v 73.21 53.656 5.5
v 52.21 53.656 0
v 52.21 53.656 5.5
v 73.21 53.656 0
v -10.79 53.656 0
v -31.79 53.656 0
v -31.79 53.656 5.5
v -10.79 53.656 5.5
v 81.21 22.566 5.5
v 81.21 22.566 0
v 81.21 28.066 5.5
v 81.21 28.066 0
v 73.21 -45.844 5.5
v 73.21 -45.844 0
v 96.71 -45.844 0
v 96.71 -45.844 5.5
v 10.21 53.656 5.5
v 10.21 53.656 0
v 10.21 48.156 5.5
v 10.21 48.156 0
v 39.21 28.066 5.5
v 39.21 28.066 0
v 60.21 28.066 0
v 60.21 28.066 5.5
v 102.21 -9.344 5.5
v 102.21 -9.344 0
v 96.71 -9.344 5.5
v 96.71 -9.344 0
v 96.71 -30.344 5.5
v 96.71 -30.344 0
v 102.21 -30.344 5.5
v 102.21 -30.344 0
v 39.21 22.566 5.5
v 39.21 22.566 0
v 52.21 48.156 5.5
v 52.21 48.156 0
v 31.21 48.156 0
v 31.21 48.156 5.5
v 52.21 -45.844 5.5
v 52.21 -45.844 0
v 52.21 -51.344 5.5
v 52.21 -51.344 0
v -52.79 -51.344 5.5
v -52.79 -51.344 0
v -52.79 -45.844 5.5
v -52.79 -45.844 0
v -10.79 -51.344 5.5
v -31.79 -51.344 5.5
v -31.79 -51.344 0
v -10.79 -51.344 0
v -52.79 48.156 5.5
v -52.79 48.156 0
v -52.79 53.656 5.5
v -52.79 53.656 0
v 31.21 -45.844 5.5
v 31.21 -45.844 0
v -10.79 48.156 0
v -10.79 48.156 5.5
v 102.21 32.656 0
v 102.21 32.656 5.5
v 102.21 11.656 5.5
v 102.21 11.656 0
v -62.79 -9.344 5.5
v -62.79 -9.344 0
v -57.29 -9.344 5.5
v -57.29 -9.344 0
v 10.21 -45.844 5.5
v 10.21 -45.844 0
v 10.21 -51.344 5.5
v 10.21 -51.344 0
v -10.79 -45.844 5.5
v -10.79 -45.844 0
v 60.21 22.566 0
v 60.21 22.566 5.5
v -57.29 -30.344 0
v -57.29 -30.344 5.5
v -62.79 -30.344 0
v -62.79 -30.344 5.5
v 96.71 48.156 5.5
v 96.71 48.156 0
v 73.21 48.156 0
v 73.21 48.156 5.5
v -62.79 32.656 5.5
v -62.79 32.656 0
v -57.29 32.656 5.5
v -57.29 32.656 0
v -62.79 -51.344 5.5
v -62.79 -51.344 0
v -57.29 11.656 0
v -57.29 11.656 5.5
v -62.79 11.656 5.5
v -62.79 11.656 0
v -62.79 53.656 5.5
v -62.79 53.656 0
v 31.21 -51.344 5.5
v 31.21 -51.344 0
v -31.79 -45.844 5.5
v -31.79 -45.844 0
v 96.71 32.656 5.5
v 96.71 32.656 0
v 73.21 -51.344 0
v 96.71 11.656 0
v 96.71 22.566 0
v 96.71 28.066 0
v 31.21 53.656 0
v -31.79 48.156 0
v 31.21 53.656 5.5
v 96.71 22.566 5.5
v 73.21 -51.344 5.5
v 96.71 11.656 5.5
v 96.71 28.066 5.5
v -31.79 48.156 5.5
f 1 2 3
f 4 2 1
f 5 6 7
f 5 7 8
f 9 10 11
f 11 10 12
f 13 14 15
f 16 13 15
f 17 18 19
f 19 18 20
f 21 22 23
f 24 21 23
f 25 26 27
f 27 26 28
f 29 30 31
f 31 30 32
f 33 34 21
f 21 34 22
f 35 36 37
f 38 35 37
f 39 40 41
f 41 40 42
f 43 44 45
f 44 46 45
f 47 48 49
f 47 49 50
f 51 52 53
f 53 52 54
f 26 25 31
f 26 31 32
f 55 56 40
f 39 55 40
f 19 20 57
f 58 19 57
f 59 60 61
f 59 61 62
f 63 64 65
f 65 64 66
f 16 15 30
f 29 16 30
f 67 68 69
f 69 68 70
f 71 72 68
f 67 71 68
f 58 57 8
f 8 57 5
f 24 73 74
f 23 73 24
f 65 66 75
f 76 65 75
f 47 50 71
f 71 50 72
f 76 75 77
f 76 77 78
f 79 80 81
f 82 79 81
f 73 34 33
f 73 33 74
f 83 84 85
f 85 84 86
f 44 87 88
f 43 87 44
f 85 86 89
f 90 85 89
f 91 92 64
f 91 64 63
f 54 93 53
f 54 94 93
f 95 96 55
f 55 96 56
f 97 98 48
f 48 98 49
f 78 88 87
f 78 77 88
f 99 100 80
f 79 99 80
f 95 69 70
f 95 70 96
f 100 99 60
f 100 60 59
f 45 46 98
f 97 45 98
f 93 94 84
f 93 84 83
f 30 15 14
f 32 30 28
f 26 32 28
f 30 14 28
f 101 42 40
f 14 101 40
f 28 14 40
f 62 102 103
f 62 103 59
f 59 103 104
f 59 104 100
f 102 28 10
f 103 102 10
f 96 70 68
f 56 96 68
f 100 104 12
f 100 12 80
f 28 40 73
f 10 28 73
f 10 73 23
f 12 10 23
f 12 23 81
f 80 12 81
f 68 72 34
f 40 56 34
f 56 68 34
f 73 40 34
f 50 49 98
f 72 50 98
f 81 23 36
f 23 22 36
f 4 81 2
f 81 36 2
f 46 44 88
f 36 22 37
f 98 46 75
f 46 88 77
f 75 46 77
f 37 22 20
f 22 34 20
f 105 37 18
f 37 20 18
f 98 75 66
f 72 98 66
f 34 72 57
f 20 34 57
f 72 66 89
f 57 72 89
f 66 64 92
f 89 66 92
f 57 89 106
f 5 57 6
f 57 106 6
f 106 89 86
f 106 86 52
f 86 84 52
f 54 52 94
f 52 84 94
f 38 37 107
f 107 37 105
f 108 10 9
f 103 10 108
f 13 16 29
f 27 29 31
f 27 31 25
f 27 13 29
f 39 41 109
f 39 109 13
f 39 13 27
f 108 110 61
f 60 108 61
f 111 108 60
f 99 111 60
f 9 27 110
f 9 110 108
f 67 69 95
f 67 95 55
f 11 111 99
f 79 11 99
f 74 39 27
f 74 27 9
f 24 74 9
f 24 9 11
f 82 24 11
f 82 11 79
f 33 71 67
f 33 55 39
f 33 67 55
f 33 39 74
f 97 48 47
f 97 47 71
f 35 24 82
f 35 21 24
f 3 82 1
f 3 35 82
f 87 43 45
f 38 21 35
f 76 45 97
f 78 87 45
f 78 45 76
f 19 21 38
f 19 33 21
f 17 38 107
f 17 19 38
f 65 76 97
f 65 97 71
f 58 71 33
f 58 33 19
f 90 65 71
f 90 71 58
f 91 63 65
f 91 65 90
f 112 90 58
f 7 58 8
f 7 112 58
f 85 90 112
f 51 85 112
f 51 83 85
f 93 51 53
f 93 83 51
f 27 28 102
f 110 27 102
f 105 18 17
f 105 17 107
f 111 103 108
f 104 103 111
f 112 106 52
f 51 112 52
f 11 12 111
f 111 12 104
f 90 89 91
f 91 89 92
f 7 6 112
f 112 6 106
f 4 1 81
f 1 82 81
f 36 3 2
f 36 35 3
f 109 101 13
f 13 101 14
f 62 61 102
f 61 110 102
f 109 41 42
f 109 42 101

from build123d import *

# Parameters (mm, degrees)
CROQUIS2_W              = 21
CROQUIS2_H              = 5.5
CROQUIS2_W_2            = 15.5
SALIENTE_EXTRUIR1_DEPTH = 5.5
CROQUIS3_W              = 21
CROQUIS3_H              = 5.5
CROQUIS3_W_2            = 7.5
SALIENTE_EXTRUIR2_DEPTH = 2.5
CROQUIS4_W              = 5.5
CROQUIS4_H              = 18.5
CROQUIS4_H_2            = 21
SALIENTE_EXTRUIR3_DEPTH = 2.5
CROQUIS5_W              = 10
CROQUIS5_H              = 5.5
CROQUIS5_W_2            = 21
SALIENTE_EXTRUIR4_DEPTH = 2.5
CROQUIS6_W              = 5.5
CROQUIS6_H              = 21
SALIENTE_EXTRUIR5_DEPTH = 2.5


with BuildPart() as part:
    # Croquis2 → Saliente-Extruir1 (new body)
    with BuildSketch(Plane.XY):
        Polygon((-60.290430527, -48.844252157), (-52.790430527, -48.844252157), (-52.790430527, -45.844252157), (-31.790430527, -45.844252157), (-31.790430527, -48.844252157), (-10.790430527, -48.844252157), (-10.790430527, -45.844252157), (10.209569473, -45.844252157), (10.209569473, -48.844252157), (31.209569473, -48.844252157), (31.209569473, -45.844252157), (52.209569473, -45.844252157), (52.209569473, -48.844252157), (73.209569473, -48.844252157), (73.209569473, -45.844252157), (94.209569473, -45.844252157), (96.709569473, -45.844252157), (96.709569473, -30.344252157), (99.709569473, -30.344252157), (99.709569473, -9.344252157), (96.709569473, -9.344252157), (96.709569473, 11.655747843), (99.709569473, 11.655747843), (99.709569473, 32.655747843), (96.709569473, 32.655747843), (96.709569473, 48.155747843), (73.209569473, 48.155747843), (73.209569473, 51.155747843), (52.209569473, 51.155747843), (52.209569473, 48.155747843), (31.209569473, 48.155747843), (31.209569473, 51.155747843), (10.209569473, 51.155747843), (10.209569473, 48.155747843), (-10.790430527, 48.155747843), (-10.790430527, 51.155747843), (-31.790430527, 51.155747843), (-31.790430527, 48.155747843), (-52.790430527, 48.155747843), (-52.790430527, 51.155747843), (-60.290430527, 51.155747843), (-60.290430527, 32.655747843), (-57.290430527, 32.655747843), (-57.290430527, 11.655747843), (-60.290430527, 11.655747843), (-60.290430527, -9.344252157), (-57.290430527, -9.344252157), (-57.290430527, -30.344252157), (-60.290430527, -30.344252157), align=None)
        with Locations((49.709569473, 25.315747843)):
            Rectangle(CROQUIS2_W, CROQUIS2_H, mode=Mode.SUBTRACT)
        with Locations((88.959569473, 25.315747843)):
            Rectangle(CROQUIS2_W_2, CROQUIS2_H, mode=Mode.SUBTRACT)
    extrude(amount=SALIENTE_EXTRUIR1_DEPTH)

    # Croquis3 → Saliente-Extruir2 (add)
    with BuildSketch(Plane(origin=(0, 51.155747843, 0), x_dir=(1, 0, 0), z_dir=(0, 1, 0))):
        with Locations((62.709569473, -2.75)):
            Rectangle(CROQUIS3_W, CROQUIS3_H)
        with Locations((20.709569473, -2.75)):
            Rectangle(CROQUIS3_W, CROQUIS3_H)
        with Locations((-21.290430527, -2.75)):
            Rectangle(CROQUIS3_W, CROQUIS3_H)
        with Locations((-56.540430527, -2.75)):
            Rectangle(CROQUIS3_W_2, CROQUIS3_H)
    extrude(amount=SALIENTE_EXTRUIR2_DEPTH)

    # Croquis4 → Saliente-Extruir3 (add)
    with BuildSketch(Plane.ZY.offset(60.290430527)):
        with Locations((2.75, -39.594252157)):
            Rectangle(CROQUIS4_W, CROQUIS4_H)
        with Locations((2.75, 1.155747843)):
            Rectangle(CROQUIS4_W, CROQUIS4_H_2)
        with Locations((2.75, 43.155747843)):
            Rectangle(CROQUIS4_W, CROQUIS4_H_2)
    extrude(amount=SALIENTE_EXTRUIR3_DEPTH)

    # Croquis5 → Saliente-Extruir4 (add)
    with BuildSketch(Plane.XZ.offset(48.844252157)):
        with Locations((-57.790430527, 2.75)):
            Rectangle(CROQUIS5_W, CROQUIS5_H)
        with Locations((-21.290430527, 2.75)):
            Rectangle(CROQUIS5_W_2, CROQUIS5_H)
        with Locations((20.709569473, 2.75)):
            Rectangle(CROQUIS5_W_2, CROQUIS5_H)
        with Locations((62.709569473, 2.75)):
            Rectangle(CROQUIS5_W_2, CROQUIS5_H)
    extrude(amount=SALIENTE_EXTRUIR4_DEPTH)

    # Croquis6 → Saliente-Extruir5 (add)
    with BuildSketch(Plane(origin=(99.709569473, 0, 0), x_dir=(0, 0, -1), z_dir=(1, 0, 0))):
        with Locations((-2.75, 22.155747843)):
            Rectangle(CROQUIS6_W, CROQUIS6_H)
        with Locations((-2.75, -19.844252157)):
            Rectangle(CROQUIS6_W, CROQUIS6_H)
    extrude(amount=SALIENTE_EXTRUIR5_DEPTH)


solid = part.part
